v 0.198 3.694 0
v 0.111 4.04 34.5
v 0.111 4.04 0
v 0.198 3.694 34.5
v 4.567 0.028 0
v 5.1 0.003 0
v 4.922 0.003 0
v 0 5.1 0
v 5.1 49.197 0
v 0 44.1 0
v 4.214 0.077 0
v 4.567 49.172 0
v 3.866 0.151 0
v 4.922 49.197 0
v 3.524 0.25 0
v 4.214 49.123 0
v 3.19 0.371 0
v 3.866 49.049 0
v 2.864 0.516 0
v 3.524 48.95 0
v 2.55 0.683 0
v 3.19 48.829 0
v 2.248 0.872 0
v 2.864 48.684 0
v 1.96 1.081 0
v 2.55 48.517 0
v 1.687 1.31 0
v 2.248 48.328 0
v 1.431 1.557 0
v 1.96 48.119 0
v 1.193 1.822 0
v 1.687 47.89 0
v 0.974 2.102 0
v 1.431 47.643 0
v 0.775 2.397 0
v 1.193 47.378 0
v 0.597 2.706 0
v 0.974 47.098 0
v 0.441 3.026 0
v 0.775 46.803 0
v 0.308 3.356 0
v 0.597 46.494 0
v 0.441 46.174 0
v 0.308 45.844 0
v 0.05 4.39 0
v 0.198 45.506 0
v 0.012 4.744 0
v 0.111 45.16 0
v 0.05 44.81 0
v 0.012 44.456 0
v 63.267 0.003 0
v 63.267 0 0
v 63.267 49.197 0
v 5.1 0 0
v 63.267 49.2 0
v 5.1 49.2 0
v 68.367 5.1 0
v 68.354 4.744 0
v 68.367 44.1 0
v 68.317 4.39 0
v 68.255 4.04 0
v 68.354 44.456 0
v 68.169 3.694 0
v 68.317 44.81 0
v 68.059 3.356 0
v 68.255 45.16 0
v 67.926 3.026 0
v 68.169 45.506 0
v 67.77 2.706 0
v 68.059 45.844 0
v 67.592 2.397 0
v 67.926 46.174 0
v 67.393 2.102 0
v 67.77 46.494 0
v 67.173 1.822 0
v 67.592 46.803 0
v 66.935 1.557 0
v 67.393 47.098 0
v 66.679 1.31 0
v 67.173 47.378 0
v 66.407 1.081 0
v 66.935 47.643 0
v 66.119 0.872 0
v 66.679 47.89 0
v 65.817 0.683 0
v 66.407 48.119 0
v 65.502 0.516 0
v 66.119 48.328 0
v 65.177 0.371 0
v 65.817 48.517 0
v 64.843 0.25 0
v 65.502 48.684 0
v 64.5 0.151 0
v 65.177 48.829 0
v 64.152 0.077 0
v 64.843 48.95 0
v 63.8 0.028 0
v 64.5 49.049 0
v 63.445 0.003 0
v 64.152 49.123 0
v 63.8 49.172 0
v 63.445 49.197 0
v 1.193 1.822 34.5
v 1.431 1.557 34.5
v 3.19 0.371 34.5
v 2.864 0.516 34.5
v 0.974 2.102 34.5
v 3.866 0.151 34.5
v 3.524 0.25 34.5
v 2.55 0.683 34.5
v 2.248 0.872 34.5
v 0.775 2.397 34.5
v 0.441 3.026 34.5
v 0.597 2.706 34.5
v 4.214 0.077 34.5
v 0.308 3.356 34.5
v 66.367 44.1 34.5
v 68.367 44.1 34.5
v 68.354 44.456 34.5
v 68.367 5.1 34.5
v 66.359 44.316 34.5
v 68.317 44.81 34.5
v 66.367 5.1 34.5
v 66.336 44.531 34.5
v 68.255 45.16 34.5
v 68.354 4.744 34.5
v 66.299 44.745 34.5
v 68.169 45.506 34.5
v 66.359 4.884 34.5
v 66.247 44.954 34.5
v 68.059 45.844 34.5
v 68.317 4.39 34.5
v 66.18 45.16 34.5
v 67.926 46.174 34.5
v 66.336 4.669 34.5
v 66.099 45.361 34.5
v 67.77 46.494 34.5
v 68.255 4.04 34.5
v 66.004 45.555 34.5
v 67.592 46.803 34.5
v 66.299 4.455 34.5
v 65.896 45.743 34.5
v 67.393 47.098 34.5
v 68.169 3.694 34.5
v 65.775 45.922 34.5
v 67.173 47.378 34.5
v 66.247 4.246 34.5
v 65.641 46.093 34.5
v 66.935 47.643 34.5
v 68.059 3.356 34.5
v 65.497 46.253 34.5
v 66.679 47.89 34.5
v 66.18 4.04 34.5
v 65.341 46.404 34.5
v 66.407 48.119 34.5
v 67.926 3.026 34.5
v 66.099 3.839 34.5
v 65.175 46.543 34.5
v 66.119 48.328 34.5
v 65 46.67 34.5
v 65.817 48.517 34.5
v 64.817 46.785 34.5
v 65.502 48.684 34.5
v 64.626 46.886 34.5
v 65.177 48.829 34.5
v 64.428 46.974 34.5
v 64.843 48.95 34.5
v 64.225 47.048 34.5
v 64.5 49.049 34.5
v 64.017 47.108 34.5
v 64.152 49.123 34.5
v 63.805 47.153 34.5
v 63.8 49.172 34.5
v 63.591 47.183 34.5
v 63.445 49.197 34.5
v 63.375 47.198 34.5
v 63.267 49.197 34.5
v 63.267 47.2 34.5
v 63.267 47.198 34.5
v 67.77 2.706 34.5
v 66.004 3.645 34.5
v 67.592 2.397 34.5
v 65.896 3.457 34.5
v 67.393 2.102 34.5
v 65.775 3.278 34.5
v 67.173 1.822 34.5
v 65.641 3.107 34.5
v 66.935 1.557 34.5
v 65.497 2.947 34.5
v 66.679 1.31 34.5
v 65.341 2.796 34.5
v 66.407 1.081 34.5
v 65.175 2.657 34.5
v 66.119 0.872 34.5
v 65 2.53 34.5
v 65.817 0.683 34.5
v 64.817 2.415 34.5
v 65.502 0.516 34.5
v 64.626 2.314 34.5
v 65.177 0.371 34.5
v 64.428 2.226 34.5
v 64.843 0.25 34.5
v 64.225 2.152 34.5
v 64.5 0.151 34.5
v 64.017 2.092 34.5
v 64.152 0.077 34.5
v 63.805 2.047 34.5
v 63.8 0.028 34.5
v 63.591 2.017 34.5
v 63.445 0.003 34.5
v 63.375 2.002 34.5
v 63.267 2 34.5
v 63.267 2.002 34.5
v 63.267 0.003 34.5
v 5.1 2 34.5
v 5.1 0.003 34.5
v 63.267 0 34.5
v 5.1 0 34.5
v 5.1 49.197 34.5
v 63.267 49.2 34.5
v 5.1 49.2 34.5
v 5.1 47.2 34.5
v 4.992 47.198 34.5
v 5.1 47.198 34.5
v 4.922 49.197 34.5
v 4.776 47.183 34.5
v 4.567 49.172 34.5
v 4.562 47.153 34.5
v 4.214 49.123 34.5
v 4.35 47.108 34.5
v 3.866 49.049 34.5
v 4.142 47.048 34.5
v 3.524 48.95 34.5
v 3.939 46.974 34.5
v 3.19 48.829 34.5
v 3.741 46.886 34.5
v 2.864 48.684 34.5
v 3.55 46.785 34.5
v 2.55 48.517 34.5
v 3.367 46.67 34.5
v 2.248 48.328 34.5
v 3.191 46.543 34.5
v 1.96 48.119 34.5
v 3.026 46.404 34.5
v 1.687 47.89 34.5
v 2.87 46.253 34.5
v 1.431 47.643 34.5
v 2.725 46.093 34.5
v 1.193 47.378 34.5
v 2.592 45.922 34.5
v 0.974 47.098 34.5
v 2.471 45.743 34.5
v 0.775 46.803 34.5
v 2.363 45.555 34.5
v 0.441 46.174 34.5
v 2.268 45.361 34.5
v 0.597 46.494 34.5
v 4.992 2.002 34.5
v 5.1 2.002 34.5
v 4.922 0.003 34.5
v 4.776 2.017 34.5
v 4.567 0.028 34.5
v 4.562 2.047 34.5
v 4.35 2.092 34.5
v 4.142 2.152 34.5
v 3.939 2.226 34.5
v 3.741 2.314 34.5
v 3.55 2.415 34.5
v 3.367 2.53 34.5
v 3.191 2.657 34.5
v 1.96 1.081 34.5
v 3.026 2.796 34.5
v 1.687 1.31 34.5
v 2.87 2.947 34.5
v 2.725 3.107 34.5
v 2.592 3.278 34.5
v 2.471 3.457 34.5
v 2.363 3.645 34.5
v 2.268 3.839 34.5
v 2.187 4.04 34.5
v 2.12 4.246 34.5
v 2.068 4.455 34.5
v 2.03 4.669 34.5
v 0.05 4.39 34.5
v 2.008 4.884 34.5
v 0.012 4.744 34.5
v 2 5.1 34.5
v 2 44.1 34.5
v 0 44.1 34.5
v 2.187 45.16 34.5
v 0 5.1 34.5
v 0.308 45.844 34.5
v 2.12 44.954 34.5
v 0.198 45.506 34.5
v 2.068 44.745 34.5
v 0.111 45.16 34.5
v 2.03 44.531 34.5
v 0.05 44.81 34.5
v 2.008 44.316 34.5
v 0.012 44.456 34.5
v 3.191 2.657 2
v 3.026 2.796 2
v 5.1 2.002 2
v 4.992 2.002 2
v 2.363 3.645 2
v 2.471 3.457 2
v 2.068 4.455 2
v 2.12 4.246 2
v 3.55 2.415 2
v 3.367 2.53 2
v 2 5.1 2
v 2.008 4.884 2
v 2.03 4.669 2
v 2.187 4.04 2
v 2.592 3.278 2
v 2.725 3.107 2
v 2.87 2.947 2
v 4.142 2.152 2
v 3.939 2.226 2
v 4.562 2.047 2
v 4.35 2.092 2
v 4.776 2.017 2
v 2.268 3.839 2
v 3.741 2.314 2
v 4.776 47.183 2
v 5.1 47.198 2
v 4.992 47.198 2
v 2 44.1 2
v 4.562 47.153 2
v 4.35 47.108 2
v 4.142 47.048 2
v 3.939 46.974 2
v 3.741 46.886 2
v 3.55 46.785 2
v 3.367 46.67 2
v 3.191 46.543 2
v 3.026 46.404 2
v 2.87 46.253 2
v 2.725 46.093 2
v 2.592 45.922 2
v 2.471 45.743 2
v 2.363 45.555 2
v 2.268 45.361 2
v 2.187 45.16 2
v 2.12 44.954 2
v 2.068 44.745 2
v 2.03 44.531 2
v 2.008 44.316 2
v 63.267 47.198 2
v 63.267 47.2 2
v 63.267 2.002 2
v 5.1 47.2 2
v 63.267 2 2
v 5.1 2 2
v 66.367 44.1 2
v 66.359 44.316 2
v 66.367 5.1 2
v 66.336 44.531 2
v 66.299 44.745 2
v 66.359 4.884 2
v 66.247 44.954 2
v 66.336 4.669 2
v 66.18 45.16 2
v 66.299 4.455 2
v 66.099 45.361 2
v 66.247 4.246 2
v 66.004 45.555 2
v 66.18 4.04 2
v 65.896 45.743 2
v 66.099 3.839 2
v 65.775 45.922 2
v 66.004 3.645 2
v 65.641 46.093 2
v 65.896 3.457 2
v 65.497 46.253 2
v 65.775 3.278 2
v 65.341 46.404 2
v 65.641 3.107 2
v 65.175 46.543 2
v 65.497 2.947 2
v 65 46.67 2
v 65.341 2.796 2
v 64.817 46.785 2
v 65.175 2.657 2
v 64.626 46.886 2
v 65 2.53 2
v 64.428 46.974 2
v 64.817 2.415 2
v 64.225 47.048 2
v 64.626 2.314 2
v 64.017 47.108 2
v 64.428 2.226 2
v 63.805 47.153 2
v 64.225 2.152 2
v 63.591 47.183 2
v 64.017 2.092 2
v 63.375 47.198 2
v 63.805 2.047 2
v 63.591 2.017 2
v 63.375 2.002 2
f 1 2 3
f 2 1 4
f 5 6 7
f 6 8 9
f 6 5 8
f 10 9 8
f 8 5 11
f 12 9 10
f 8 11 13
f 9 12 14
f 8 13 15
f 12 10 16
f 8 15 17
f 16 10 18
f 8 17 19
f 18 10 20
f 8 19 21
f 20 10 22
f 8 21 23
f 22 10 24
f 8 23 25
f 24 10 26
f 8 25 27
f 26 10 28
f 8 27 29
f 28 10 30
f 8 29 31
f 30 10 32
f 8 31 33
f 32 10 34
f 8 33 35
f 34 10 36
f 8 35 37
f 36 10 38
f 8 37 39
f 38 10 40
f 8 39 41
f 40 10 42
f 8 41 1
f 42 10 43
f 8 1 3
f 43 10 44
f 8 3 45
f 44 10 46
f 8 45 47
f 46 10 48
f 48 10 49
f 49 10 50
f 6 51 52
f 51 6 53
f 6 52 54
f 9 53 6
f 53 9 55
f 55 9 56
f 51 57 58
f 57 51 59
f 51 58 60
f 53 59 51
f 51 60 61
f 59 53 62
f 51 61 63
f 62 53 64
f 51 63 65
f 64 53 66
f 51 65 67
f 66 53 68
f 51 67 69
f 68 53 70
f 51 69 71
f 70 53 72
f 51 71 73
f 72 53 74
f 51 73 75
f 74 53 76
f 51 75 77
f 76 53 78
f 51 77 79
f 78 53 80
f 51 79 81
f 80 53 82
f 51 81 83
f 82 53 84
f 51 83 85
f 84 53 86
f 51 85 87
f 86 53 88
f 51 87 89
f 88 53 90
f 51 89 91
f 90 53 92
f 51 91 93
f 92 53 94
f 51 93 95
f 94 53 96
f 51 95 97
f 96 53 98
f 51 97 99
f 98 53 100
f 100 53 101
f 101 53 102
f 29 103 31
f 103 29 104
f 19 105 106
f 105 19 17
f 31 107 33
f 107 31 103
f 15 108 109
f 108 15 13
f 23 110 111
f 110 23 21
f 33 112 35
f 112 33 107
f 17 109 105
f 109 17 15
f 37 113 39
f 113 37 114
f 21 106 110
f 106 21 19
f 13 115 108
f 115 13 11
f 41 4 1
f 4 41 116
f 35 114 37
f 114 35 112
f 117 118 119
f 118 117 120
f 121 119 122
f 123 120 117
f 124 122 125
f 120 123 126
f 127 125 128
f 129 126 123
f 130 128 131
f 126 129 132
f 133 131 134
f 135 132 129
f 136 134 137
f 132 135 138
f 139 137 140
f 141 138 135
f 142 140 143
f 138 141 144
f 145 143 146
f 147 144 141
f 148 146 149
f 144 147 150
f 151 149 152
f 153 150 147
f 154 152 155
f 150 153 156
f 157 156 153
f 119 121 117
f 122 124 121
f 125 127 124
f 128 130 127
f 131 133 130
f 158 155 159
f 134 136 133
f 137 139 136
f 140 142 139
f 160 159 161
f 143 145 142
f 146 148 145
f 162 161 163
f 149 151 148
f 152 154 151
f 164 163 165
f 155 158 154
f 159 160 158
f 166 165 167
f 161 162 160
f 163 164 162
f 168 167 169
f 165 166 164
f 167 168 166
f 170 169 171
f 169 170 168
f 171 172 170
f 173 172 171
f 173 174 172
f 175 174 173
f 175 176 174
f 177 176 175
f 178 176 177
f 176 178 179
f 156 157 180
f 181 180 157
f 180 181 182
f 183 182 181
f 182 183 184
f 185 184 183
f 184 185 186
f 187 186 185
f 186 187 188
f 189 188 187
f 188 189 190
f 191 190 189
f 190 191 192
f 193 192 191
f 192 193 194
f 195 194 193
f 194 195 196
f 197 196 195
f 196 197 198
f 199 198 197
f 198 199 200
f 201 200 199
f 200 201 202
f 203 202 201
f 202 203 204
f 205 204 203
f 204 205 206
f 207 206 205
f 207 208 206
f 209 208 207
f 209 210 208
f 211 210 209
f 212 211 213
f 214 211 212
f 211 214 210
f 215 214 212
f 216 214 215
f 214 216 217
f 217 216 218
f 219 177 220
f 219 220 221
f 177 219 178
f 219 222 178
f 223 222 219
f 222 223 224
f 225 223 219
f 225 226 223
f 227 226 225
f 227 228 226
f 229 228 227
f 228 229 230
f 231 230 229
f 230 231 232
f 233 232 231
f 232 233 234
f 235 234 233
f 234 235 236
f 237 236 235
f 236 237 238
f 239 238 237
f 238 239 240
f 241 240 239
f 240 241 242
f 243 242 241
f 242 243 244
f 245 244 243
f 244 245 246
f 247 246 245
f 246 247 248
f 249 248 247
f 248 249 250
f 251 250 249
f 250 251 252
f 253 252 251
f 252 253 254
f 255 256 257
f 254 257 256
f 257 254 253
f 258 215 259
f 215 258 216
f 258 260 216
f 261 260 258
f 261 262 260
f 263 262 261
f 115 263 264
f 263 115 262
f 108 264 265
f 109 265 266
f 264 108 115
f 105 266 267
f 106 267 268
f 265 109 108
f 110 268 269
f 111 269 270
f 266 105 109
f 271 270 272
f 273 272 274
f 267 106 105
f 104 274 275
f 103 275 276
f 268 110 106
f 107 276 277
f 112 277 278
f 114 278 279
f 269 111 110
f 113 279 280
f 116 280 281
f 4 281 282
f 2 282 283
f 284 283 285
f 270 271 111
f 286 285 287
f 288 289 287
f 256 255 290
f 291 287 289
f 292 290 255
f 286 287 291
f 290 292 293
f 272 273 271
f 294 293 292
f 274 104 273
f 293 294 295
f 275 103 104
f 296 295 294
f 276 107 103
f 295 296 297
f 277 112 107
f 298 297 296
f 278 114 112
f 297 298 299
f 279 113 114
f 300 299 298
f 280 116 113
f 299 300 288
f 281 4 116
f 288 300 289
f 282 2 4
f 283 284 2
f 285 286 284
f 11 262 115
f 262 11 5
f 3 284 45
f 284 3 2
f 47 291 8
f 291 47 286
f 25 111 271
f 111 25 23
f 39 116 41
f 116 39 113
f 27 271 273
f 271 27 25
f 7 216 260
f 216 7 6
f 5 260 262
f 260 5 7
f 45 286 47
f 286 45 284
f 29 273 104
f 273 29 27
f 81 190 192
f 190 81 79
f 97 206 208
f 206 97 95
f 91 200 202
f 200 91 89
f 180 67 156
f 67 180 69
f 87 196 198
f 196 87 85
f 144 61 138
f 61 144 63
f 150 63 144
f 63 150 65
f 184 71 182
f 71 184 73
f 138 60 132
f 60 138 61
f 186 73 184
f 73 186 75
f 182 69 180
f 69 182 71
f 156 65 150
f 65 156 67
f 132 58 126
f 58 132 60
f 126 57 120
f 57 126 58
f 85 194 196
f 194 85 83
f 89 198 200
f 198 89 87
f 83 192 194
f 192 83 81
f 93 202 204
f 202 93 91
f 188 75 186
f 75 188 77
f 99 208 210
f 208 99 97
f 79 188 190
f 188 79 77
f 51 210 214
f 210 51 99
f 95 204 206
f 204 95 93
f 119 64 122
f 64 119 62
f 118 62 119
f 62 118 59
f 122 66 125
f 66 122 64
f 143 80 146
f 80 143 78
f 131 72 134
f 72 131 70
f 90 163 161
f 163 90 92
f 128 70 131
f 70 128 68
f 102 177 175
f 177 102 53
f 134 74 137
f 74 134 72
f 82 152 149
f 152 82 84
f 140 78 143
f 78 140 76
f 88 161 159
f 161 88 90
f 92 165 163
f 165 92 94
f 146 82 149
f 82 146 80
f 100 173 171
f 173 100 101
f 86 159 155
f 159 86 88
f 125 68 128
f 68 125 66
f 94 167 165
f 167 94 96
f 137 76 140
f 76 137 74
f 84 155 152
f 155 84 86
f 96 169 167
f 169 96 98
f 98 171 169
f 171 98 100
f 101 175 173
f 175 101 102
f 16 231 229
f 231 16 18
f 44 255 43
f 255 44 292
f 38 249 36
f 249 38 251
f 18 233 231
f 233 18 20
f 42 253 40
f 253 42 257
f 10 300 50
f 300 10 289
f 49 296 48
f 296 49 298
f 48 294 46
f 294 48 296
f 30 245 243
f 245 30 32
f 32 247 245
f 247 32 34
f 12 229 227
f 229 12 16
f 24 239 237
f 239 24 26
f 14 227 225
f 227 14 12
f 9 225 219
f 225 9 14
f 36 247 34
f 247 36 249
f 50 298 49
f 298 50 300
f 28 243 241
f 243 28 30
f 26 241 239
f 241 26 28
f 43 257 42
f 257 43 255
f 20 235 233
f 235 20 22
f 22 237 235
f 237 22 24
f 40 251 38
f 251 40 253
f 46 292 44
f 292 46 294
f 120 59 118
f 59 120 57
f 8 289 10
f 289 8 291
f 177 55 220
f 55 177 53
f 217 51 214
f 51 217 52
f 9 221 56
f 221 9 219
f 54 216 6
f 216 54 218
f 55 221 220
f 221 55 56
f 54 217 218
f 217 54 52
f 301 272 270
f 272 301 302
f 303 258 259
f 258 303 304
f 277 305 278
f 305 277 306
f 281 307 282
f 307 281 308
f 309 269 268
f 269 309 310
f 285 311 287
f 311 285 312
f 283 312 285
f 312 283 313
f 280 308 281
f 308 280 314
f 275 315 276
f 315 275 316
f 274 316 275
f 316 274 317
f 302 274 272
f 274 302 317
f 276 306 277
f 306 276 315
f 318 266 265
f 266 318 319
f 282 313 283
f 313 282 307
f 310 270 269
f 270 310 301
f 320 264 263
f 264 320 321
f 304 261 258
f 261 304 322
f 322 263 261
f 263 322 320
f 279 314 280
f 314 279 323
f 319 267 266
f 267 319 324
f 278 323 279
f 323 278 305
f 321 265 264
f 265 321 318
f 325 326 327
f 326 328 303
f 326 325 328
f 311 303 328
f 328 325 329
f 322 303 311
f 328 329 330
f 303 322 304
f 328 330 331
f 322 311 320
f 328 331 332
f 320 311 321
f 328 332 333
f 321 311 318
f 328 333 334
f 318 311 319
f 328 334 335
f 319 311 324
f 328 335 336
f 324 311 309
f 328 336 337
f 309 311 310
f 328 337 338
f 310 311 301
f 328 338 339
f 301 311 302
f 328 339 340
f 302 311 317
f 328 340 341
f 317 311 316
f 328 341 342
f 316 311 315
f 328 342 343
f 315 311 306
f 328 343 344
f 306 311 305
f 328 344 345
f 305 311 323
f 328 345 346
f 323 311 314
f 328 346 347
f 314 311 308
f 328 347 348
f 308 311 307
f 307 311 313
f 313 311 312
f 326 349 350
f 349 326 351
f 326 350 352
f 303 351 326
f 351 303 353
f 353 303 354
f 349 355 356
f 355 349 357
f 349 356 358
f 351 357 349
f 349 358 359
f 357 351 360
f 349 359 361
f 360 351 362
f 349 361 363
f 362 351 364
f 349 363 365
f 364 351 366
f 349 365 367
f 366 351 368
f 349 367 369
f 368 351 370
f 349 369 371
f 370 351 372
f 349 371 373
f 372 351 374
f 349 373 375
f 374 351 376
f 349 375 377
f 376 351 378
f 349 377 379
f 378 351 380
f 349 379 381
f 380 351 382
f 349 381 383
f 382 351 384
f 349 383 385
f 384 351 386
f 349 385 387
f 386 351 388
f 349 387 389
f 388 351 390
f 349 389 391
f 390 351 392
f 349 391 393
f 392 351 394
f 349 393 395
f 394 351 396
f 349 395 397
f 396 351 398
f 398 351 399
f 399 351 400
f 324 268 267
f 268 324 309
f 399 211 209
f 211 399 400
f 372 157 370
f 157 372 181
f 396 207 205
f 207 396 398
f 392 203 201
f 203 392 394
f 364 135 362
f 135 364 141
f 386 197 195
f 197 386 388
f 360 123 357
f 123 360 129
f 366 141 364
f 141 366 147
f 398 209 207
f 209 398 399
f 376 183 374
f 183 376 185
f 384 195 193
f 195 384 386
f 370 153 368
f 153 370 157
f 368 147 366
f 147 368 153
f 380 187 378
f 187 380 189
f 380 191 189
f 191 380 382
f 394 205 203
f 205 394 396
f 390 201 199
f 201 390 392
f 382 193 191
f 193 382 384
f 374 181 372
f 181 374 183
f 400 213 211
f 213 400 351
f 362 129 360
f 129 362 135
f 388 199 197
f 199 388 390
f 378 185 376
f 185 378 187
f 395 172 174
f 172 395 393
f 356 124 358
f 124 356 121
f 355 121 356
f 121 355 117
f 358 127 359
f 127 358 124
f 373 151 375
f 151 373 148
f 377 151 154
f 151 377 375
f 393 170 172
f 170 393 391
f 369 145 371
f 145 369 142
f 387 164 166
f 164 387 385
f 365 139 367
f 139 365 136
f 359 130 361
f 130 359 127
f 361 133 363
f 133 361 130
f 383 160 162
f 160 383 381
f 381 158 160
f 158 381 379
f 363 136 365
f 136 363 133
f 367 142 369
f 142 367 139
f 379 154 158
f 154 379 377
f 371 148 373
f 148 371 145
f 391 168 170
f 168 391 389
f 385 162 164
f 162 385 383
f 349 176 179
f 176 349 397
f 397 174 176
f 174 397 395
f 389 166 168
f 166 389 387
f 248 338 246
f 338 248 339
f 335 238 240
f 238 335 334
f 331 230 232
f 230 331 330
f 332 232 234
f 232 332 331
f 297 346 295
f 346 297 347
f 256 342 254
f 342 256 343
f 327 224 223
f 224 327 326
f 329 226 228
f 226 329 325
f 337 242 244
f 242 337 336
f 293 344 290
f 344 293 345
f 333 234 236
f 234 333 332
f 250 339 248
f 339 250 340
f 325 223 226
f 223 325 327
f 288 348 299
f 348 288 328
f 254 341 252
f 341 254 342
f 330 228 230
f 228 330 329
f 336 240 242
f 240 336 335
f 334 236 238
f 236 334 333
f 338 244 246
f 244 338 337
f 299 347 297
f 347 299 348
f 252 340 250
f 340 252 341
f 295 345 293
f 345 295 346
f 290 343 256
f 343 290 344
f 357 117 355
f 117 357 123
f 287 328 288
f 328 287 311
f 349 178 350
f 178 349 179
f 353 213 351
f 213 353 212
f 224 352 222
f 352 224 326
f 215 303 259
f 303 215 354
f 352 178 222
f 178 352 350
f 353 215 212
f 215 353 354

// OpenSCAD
// file: ../_lib/cubepp.scad
/*********************************************************************************************
* CUBE++ (cubepp)                                                                            *
* '-> by Jiri Kubik (jiri.kub@gmail.com) in 2020-2021                                        *
* '-> simple but essential library which adds two new cube designs.                          *
*     '-> _round_cube creates cube with corners rounded in XY-plane                          *
*     '-> _shpere_cube creates cube with corners rounded in all 3 dimensions                 *
*     '-> _chopped_cube (planned for the future) coppes corners of the cube                  *
* '-> recommended module to be used is cube_{r,s,c} with same interface as the original      *
*     cube, see documentation bellow                                                         *
*********************************************************************************************/

// CURRENT VERSION: 0.0.1
// Change log
// '-> 0.0.1 - modules for cube_r and cube_s finalized
// '-> 0.0.2 - box and box_r added
// planned
// '-> cube_c for cube with corners cut of

$fn = 45;
NAN = acos(2);

// creates cube of given dimensions x,y,z with the corner rounded in the XY plane by diameter d
// '-> x - dimension in x axis
// '-> y - dimension in y axis
// '-> z - dimension in z axis
// '-> d - diameter of corners rounded in XY-plane
// '-> center same as in cube module
module _round_cube(x,y,z,d,center=false)
{
    assert(x >= d && y >= d, str("given diameter(d=",d,") exceed one of sides(x=",x,",y=",y,")! Use round_cube_lazy to automatically choose diameter."));
    
    A = x-d;
    B = y-d;
    C = z;
    
    // solve center transform
    t = center ? [d/2-x/2,d/2-y/2,-y/2] : [d/2,d/2,0];
    
    // hull-less implementation to speed up process
    translate(t)
    {
        // corners
        cylinder(d=d, h=C);
        translate([A,0,0]) cylinder(d=d, h=C);
        translate([A,B,0]) cylinder(d=d, h=C);
        translate([0,B,0]) cylinder(d=d, h=C);
        
        // fill
        translate([-d/2,0,0]) cube([x,y-d,z]);
        translate([0,-d/2,0]) cube([x-d,y,z]);
    }
    
    // hull-based implementation
    /*
    translate([d/2,d/2,0])
    hull()
    {
        cylinder(d=d, h=C);
        translate([A,0,0]) cylinder(d=d, h=C);
        translate([A,B,0]) cylinder(d=d, h=C);
        translate([0,B,0]) cylinder(d=d, h=C);
    } 
    */
}

// wrapper for _round_cube module
module round_cube (x,y,z,d, center=false)
{
    _round_cube(x,y,z,d, center);
}

// wrapper for _round_cube module
// '-> dimensions t=[x,y,z]
// '-> d - diameter of corners rounded in XY-plane
module round_cube (t,d, center=false)
{   
    assert(len(t)==3, str("given size vector has size, ", len(t), " but size 3 is required"));
    _round_cube(t.x,t.y,t.z,d, center);
}

// wrapper for _round_cube module
// '-> same interface and name as cube module
module cube_r(t,d, center=false)
{
    round_cube(t,d, center);
}

// creates cube of given dimenions x,y,z with corners rounded in XYZ by diameter d
// '-> x - dimension in x axis
// '-> y - dimension in y axis
// '-> z - dimension in z axis
// '-> d - rounded corners diameter
// '-> center same as in cube module
module _sphere_cube (x,y,z,d, center=false)
{
    assert(x >= d && y >= d, str("given diameter(d=",d,") exceed one of sides(x=",x,",y=",y,")! Use round_cube_lazy to automatically choose diameter."));
    
    A = x-d;
    B = y-d;
    C = z-d;
    R = d/2;
    
    // solve center transform
    t = center ? [R-x/2,R-y/2,R-z/2] : [R,R,R];
       
    // minkowski implementation
    translate(t)
    minkowski()
    {
        cube([A,B,C]);
        sphere(r=R);
    }
    
}

// _sphere_cube wrapper with same arguments as original function
module sphere_cube(x,y,z,d, center=false)
{
    _sphere_cube(x,y,z,d, center);
}

// wrapper for _sphere_cube module
// '-> dimensions t=[x,y,z]
// '-> d - rounded corners diameter
module sphere_cube(t,d, center=false)
{
    assert(len(t)==3, str("given size vector has size, ", len(t), " but size 3 is required"));
    _sphere_cube(t.x,t.y,t.z,d, center);
}

// wrapper for _sphere_cube module
// '-> same interface and name as cube module
module cube_s (t,d, center=false)
{
    sphere_cube(t,d, center);
}

/********
* BOXES *
********/

// basic box
// '-> x,y,z - outer dimensions
// '-> t - wall thickness
module _box(x,y,z,wt,bt, center=false)
{   
    echo(str(x,y,z,wt,bt,center));
    assert(wt>0, str("given wall thickness wt=",wt," must be greater than zero"));
    if (wt!=bt)
    {
        assert(bt>0, str("given botton thickness bt=",bt," must be greater than zero"));
    }
    // solve center transform
    tf = center ? [-x/2,-y/2,-z/2] : [0,0,0];
    
    translate(tf)
    difference()
    {
        
        // outer shell
        cube([x,y,z]);
        
        // hole
        translate([wt,wt,bt])
            cube([x-2*wt,y-2*wt,z]);
    }
}

// _box wrapper
module box_xyz(x,y,z,wt,bt=NAN, center=false)
{
    _bt = is_num(bt) ? bt : wt;
    _box(x,y,z,wt,_bt, center);
}


// _box wrapper
module box(s,wt,bt=NAN, center=false)
{
    assert(len(s)==3, str("given size vector has size, ", len(s), " but size 3 is required"));
    _bt = is_num(bt) ? bt : wt;
    _box(s.x,s.y,s.z,wt,_bt, center);
}

// box with corners round in XY plane
// x,y,z - outer dimensions
// d - rounding diameter
// bt - bottom thickness
// wt - wall thickness
module _box_r(x,y,z,d,wt,bt, center=false)
{
    assert(wt>0, str("given wall thickness wt=",wt," must be greater than zero"));
    if (wt!=bt)
    {
        assert(bt>0, str("given botton thickness bt=",bt," must be greater than zero"));
    }
    
    assert(d>=2*wt, str("given diameter d=",d," must be at least twice of wall thickness wt=", wt));  
   
    r = d/2;
    // solve center transform
    tf = center ? [r-x/2,r-y/2,r-z/2] : [0,0,0];
    
    translate(tf)
    difference()
    {
        
        // outer shell
        cube_r([x,y,z],d);
        
        // hole
        translate([wt,wt,bt])
            cube_r([x-2*wt,y-2*wt,z],d-2*wt);
    }
}

// _box_r wrapper
module box_r_xyz(x,y,z,d,wt,bt=NAN, center=false)
{   
    _bt = is_num(bt) ? bt : wt;
    _box_r(x,y,z,d,wt,_bt, center);
}


// _box_r wrapper
module box_r(s,d,wt,bt=NAN, center=false)
{
    assert(len(s)==3, str("given size vector has size, ", len(s), " but size 3 is required"));
    _bt = is_num(bt) ? bt : wt;
    _box_r(s.x,s.y,s.z,d,wt,_bt, center);
}


////////////////////////////////////////////////////////////////////////////
// trash to be removed

/*
module round_cube_lazy(x=40,y=30,z=2,d=10)
{
    if (x<d || y<d)
    {
        echo("Avoiding dissaster by choosing new diameter.");
    }
    
    _d = min([x,y,d]);
    round_cube(x,y,z,_d);
}


module box (x=82,y=154,z=52,d=20,t=2)
{
    A = x-d;
    B = y-d;
    C = z;
    
    //%translate([-d/2,-d/2,0]) cube([x,y,z]);
    difference()
    {
        hull()
        {
            cylinder(d=d, h=C);
            translate([A,0,0]) cylinder(d=d, h=C);
            translate([A,B,0]) cylinder(d=d, h=C);
            translate([0,B,0]) cylinder(d=d, h=C);
        }
        
        translate([-t/2,-t/2,t])
        hull()
        {
            translate([t,t,0]) cylinder(d=d-t, h=C);
            translate([A,t,0]) cylinder(d=d-t, h=C);
            translate([A,B,0]) cylinder(d=d-t, h=C);
            translate([t,B,0]) cylinder(d=d-t, h=C);
        }
    }
}
*/
// main file
include<../_lib/cubepp.scad>;

// GENERIC PARAMETERS
eps = 0.01;
$fn = 90;
tol_t = 0.1;    // tight tolerance
tol = 0.25;     // default tolerance
tol_z = 0.5;    // tolerance for bridges
tol_f = 0.4;    // free movement tolerance

// Carcassone parameters
// '-> cs as prefix
// '-> box parameters
cs_bx = 423;
cs_by = 308;
cs_bz = 90;
// '-> card parameters
cs_ca = 45.5;   // card side
cs_ct = 2.22;   // card thickness
// '-> score board parameters
cs_sbx = 260;
cs_sby = 180;
cs_sbz = 2;

// derived parameters
// carcassonne section parameters
// '-> whole carcassone box must be devided into four sections
//     '-> box is too big for print area of common printers
cs_sx = cs_bx/2;
cs_sy = cs_by/2;
// testing sizes
//cs_sx = 75;
//cs_sy = 50;
cs_sz = cs_bz;  // z coordinate is not devided
cs_sd = 15;     // round diameter
cs_swt = 2;     // wall thickness
cs_sbt = 2;     // bottom (wall) thickness
cs_stt = 4;     // top thickness

// carcassonne section cover
// '-> cs_sc
// '-> cover for box section, obsolete
/*
cs_scx = cs_sx;
cs_scy = cs_sy;
cs_scz = cs_sbt+cs_ca+(cs_bz-cs_ca-cs_sbt)/2;
*/

// [!] each section is either used or empty frame is added to fill the area
// [!] filled area is devided into compartements:
//     '-> lower card compartement
//     '-> upper figure compartement

// card compartement parameteres
// '-> cs_sp
// '-> fill in whole box sections in XY plane
// '-> z coordinate is defined by card size and the bottom wall thisckness
cs_ccx = cs_sx;
cs_ccy = cs_sy;
cs_ccz = cs_sbt+cs_ca+tol_z+cs_stt;

// card storage separator parameters
// '-> cs_css
cs_cssx = 2*cs_ct;
cs_cssy = cs_ct;
cs_cssz = cs_ca;
cs_cssdist = cs_ct;

// card storage parameters
// '-> cs_ch
cs_csx = cs_ca+tol;
cs_csz = cs_ca+tol;

// computing distance between card storages and number of card storage
// '-> from x dimentison subrstract rounding diameters
// '-> devide this useful dimension by the x size of the storage with separator rails
cs_csx_cnt = floor((cs_sx-cs_sd)/(cs_csx+cs_cssdist+cs_cssx+cs_cssdist));
echo(cs_csx_cnt);
cs_csx_dist = (cs_sx-2*(cs_swt+tol)-cs_csx_cnt*cs_csx)/(cs_csx_cnt+1);

// computing number of card stored in the single card storage
// '-> aka card count
cs_csy_cnt = floor((cs_sy-4*cs_swt-2*tol)/cs_ct);
echo(cs_csy_cnt);
cs_csy_dist = cs_sy-4*cs_swt-2*tol-cs_csy_cnt*cs_ct;
cs_csy = cs_csy_cnt*cs_ct;

module card_compartement()
{
    difference()
    {
        // main body
        cube_r([cs_ccx,cs_ccy, cs_ccz], cs_sd);
        
        // center cut
        translate([cs_swt,cs_swt,cs_sbt+cs_ca/2])
            cube_r([cs_ccx-2*cs_swt, cs_ccy-2*cs_swt, cs_ccz], cs_sd-2*cs_swt)
                
        // hole for cards
        echo([cs_csx, cs_csy, cs_csz]);
        for(i=[0:cs_csx_cnt-1])
        {
            off_x = i*(cs_csx_dist+cs_csx)+cs_csx_dist+cs_swt+tol;
            translate([off_x,tol+2*cs_swt,cs_sbt])
                cube([cs_csx, cs_csy, cs_csz]);
            
            
            // holes for the card separator
            for(j=[0:round(cs_csy_cnt/2)-1])
            {
                off_y = 2*j*cs_ct;
                // left side
                translate([off_x-3*cs_ct, tol+2*cs_swt+off_y, cs_sbt])
                    cube([2*cs_ct,cs_ct,cs_ca]);
                // right side
                translate([off_x+cs_csx+1*cs_ct, tol+2*cs_swt+off_y, cs_sbt])
                    cube([2*cs_ct,cs_ct,cs_ca]);
            }
            
        }
        
        // cutting sides
        translate([cs_sd/2,-eps,cs_ccz+cs_ca/2])
            rotate([-90,0,0])
                cube_r([cs_sx-cs_sd,cs_ca+tol_z+cs_stt, cs_sy+2*eps], cs_ca);  
        
        // cutting finger holes
        translate([-eps,cs_sy/2,cs_ccz-cs_stt-cs_ca/4])
            rotate([0,90,0])
                cylinder(d=cs_ca/2-2*cs_sbt,h=cs_sx+2*eps);
        
        
    }
}

//card_compartement();

// cart separator thickness
cs_cst = 2;

module card_separator()
{
    difference()
    {
        union()
        {            
            // main shape
            cube_r([cs_ca-2*tol,cs_ca-2*tol,2*cs_cst],4);
                
            // upper connector
            translate([-3*cs_ct,cs_ca/2+tol,0])
                cube_r([cs_ca-2*tol+6*cs_ct,cs_ca/2-3*tol,cs_cst], 4);
            
                // left wing
            translate([0-cs_ct-tol-2*cs_cst-(cs_ct-cs_cst),0,0])
                cube_r([2*cs_cst, cs_ca-2*tol, cs_cst],4);
            //%translate([0-cs_ct-tol-(cs_ct-cs_cst),0,0])
            //    cube([cs_ct+tol+(cs_ct-cs_cst), cs_ca-2*tol, cs_cst]);
            //right wing
            translate([cs_ca-2*tol+cs_ct+tol+(cs_ct-cs_cst),0,0])
                cube_r([2*cs_cst, cs_ca-2*tol, cs_cst],4);
            //%translate([cs_ca-2*tol,0,0])
            //    cube([cs_ct+tol+(cs_ct-cs_cst), cs_ca-2*tol, cs_cst]);
            
        }
        
        // cut for easier access
        translate([cs_ca/2-2*tol,cs_ca-2*tol,-eps])
            cylinder(d=0.75*cs_ca-2*tol,h=2*cs_cst+2*eps);
    }  
}

//card_separator();

// figures compartement parameters
// '-> cs_fc
cs_fcx = cs_sx;
cs_fcy = cs_sy;
cs_fcz = cs_sz - cs_ccz - tol_z - tol_z;
echo(cs_fcz);

module figure_compartement()
{
    difference()
    {
        union()
        {
            // main shape
            box_r([cs_fcx, cs_fcy, cs_fcz], cs_sd, cs_swt, cs_sbt);
            
            // interface
            translate([cs_swt+tol_f, cs_swt+tol_f, -cs_stt])
                cube_r([cs_fcx-2*cs_swt-2*tol_f,cs_fcy-2*cs_swt-2*tol_f,cs_stt],cs_sd-2*cs_swt-2*tol_f);
        }
        
        // side cut
        //translate([cs_sd/2,-eps,cs_fcz+cs_ca/2])
        translate([cs_sd/2,-eps,cs_fcz+cs_fcz/2])
            rotate([-90,0,0])
                cube_r([cs_sx-cs_sd, cs_fcz-2*cs_sbt, cs_sy+2*eps], cs_fcz-2*cs_sbt);  
        
        
        // cutting finger holes
        translate([-eps,cs_sy/2, cs_fcz/2+cs_sbt])
            rotate([0,90,0])
                cylinder(d=cs_ca/2-2*cs_sbt,h=cs_sx+2*eps);
        
    }
}

/*
translate([0,0,cs_ccz+tol_z])
    figure_compartement();
*/

// single color figures storage parameters
// '-> cs_fs
cs_fsx = (cs_fcx - 2*cs_swt - 6*tol_f)/3;
cs_fsy = (cs_fcy - 2*cs_swt - 6*tol_f)/3;
cs_fsz = cs_fcz - cs_sbt - tol_z;
cs_fsd = cs_sd-2*cs_swt-2*tol_f;

module figure_storage()
{
    // main shape
    box_r([cs_fsx, cs_fsy, cs_fsz], cs_fsd, cs_swt);
}

figure_storage();

/*
translate([0,0,cs_ccz+2*tol_z+cs_sbt])
for (i=[0:2])
{
    x_off = i*(cs_fsx+tol_f)+tol_f+cs_swt;
    for(j=[0:2])
    {
        y_off = j*(cs_fsy+tol_f)+tol_f+cs_swt;
        translate([x_off, y_off,0])
            figure_storage();
    }
}
*/
